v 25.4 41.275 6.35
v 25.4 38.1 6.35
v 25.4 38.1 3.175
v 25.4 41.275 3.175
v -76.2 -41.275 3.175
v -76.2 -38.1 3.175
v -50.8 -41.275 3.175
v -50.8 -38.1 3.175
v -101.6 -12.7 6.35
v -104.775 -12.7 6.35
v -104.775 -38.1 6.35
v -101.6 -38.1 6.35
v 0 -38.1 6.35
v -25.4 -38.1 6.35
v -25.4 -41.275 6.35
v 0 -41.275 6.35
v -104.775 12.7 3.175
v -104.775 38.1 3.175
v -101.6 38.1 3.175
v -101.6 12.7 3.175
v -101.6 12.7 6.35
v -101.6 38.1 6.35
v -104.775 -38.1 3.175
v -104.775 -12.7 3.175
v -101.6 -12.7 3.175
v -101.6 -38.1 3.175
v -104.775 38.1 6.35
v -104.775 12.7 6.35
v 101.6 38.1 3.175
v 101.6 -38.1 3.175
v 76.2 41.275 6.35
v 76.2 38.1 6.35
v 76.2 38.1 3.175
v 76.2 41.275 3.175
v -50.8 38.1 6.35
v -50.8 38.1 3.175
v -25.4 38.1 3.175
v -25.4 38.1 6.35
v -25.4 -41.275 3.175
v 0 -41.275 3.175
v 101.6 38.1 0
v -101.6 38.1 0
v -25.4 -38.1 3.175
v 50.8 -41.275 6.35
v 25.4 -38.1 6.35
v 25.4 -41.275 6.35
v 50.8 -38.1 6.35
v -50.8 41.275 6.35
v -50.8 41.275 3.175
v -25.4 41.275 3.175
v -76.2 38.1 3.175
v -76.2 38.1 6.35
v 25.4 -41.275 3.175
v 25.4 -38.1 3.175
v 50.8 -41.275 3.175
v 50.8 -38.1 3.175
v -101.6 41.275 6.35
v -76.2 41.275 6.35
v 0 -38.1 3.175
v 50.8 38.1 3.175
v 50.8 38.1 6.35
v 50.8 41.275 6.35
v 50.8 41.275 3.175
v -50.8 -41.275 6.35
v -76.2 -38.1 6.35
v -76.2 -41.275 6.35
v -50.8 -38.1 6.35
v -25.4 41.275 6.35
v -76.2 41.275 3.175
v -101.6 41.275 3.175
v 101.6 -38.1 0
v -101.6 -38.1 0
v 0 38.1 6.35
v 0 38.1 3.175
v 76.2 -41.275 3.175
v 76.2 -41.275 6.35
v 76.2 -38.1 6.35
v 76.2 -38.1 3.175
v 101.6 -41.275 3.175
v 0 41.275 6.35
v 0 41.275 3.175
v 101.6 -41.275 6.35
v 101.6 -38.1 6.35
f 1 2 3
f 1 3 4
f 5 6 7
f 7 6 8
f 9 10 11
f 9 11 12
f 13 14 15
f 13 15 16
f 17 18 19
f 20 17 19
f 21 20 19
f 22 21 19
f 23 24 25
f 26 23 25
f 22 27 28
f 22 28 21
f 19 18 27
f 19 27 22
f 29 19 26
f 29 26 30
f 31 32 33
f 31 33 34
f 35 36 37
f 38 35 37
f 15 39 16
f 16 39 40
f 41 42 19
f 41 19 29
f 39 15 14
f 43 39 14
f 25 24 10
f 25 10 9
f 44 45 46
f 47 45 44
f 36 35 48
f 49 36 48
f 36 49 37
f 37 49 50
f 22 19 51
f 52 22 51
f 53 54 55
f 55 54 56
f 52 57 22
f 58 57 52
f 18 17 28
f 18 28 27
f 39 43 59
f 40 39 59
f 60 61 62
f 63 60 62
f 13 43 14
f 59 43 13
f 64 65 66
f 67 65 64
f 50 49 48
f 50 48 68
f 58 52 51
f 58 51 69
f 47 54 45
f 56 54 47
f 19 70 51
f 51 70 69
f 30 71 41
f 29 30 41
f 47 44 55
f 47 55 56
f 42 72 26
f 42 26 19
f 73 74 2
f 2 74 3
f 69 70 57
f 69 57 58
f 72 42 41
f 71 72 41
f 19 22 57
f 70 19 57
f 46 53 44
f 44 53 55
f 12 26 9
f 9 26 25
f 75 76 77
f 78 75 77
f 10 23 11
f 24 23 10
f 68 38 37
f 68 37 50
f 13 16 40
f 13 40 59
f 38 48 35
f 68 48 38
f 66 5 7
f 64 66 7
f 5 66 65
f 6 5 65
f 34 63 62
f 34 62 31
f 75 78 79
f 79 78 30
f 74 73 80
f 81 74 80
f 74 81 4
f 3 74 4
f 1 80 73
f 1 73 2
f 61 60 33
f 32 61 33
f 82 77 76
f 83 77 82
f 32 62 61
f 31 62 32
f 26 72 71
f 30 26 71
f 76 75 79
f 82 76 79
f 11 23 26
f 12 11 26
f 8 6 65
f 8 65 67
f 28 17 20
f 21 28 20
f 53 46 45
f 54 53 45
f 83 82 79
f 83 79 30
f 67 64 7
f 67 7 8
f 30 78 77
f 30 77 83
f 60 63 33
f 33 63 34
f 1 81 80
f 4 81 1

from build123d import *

# Parameters (mm, degrees)
SKETCH1_W             = 203.2
SKETCH1_H             = 76.2
BOSS_EXTRUDE1_DEPTH   = 3.175
SKETCH2_W             = 25.4
SKETCH2_H             = 3.175
BOSS_EXTRUDE2_DEPTH   = 3.175
BOSS_EXTRUDE2_2_DEPTH = 3.175
BOSS_EXTRUDE2_3_DEPTH = 3.175
BOSS_EXTRUDE2_4_DEPTH = 3.175
SKETCH3_W             = 25.4
SKETCH3_H             = 3.175
BOSS_EXTRUDE3_DEPTH   = 3.175
BOSS_EXTRUDE3_2_DEPTH = 3.175
BOSS_EXTRUDE3_3_DEPTH = 3.175
BOSS_EXTRUDE3_4_DEPTH = 3.175
SKETCH4_W             = 3.175
SKETCH4_H             = 25.4
BOSS_EXTRUDE4_DEPTH   = 3.175
BOSS_EXTRUDE4_2_DEPTH = 3.175


with BuildPart() as part:
    # Sketch1 → Boss-Extrude1 (new body)
    with BuildSketch(Plane.XY):
        Rectangle(SKETCH1_W, SKETCH1_H)
    extrude(amount=BOSS_EXTRUDE1_DEPTH)


with BuildPart() as body_2:
    # Sketch2 → Boss-Extrude2 (new body)
    with BuildSketch(Plane.XY.offset(3.175)):
        with Locations((-38.1, 39.6875)):
            Rectangle(SKETCH2_W, SKETCH2_H)
    extrude(amount=BOSS_EXTRUDE2_DEPTH)


with BuildPart() as body_3:
    # Sketch2 → Boss-Extrude2 2 (new body)
    with BuildSketch(Plane.XY.offset(3.175)):
        with Locations((-88.9, 39.6875)):
            Rectangle(SKETCH2_W, SKETCH2_H)
    extrude(amount=BOSS_EXTRUDE2_2_DEPTH)


with BuildPart() as body_4:
    # Sketch2 → Boss-Extrude2 3 (new body)
    with BuildSketch(Plane.XY.offset(3.175)):
        with Locations((12.7, 39.6875)):
            Rectangle(SKETCH2_W, SKETCH2_H)
    extrude(amount=BOSS_EXTRUDE2_3_DEPTH)


with BuildPart() as body_5:
    # Sketch2 → Boss-Extrude2 4 (new body)
    with BuildSketch(Plane.XY.offset(3.175)):
        with Locations((63.5, 39.6875)):
            Rectangle(SKETCH2_W, SKETCH2_H)
    extrude(amount=BOSS_EXTRUDE2_4_DEPTH)


with BuildPart() as body_6:
    # Sketch3 → Boss-Extrude3 (new body)
    with BuildSketch(Plane.XY.offset(3.175)):
        with Locations((38.1, -39.6875)):
            Rectangle(SKETCH3_W, SKETCH3_H)
    extrude(amount=BOSS_EXTRUDE3_DEPTH)


with BuildPart() as body_7:
    # Sketch3 → Boss-Extrude3 2 (new body)
    with BuildSketch(Plane.XY.offset(3.175)):
        with Locations((88.9, -39.6875)):
            Rectangle(SKETCH3_W, SKETCH3_H)
    extrude(amount=BOSS_EXTRUDE3_2_DEPTH)


with BuildPart() as body_8:
    # Sketch3 → Boss-Extrude3 3 (new body)
    with BuildSketch(Plane.XY.offset(3.175)):
        with Locations((-12.7, -39.6875)):
            Rectangle(SKETCH3_W, SKETCH3_H)
    extrude(amount=BOSS_EXTRUDE3_3_DEPTH)


with BuildPart() as body_9:
    # Sketch3 → Boss-Extrude3 4 (new body)
    with BuildSketch(Plane.XY.offset(3.175)):
        with Locations((-63.5, -39.6875)):
            Rectangle(SKETCH3_W, SKETCH3_H)
    extrude(amount=BOSS_EXTRUDE3_4_DEPTH)


with BuildPart() as body_10:
    # Sketch4 → Boss-Extrude4 (new body)
    with BuildSketch(Plane.XY.offset(3.175)):
        with Locations((-103.1875, -25.4)):
            Rectangle(SKETCH4_W, SKETCH4_H)
    extrude(amount=BOSS_EXTRUDE4_DEPTH)


with BuildPart() as body_11:
    # Sketch4 → Boss-Extrude4 2 (new body)
    with BuildSketch(Plane.XY.offset(3.175)):
        with Locations((-103.1875, 25.4)):
            Rectangle(SKETCH4_W, SKETCH4_H)
    extrude(amount=BOSS_EXTRUDE4_2_DEPTH)


solid = Compound([part.part, body_2.part, body_3.part, body_4.part, body_5.part, body_6.part, body_7.part, body_8.part, body_9.part, body_10.part, body_11.part])
